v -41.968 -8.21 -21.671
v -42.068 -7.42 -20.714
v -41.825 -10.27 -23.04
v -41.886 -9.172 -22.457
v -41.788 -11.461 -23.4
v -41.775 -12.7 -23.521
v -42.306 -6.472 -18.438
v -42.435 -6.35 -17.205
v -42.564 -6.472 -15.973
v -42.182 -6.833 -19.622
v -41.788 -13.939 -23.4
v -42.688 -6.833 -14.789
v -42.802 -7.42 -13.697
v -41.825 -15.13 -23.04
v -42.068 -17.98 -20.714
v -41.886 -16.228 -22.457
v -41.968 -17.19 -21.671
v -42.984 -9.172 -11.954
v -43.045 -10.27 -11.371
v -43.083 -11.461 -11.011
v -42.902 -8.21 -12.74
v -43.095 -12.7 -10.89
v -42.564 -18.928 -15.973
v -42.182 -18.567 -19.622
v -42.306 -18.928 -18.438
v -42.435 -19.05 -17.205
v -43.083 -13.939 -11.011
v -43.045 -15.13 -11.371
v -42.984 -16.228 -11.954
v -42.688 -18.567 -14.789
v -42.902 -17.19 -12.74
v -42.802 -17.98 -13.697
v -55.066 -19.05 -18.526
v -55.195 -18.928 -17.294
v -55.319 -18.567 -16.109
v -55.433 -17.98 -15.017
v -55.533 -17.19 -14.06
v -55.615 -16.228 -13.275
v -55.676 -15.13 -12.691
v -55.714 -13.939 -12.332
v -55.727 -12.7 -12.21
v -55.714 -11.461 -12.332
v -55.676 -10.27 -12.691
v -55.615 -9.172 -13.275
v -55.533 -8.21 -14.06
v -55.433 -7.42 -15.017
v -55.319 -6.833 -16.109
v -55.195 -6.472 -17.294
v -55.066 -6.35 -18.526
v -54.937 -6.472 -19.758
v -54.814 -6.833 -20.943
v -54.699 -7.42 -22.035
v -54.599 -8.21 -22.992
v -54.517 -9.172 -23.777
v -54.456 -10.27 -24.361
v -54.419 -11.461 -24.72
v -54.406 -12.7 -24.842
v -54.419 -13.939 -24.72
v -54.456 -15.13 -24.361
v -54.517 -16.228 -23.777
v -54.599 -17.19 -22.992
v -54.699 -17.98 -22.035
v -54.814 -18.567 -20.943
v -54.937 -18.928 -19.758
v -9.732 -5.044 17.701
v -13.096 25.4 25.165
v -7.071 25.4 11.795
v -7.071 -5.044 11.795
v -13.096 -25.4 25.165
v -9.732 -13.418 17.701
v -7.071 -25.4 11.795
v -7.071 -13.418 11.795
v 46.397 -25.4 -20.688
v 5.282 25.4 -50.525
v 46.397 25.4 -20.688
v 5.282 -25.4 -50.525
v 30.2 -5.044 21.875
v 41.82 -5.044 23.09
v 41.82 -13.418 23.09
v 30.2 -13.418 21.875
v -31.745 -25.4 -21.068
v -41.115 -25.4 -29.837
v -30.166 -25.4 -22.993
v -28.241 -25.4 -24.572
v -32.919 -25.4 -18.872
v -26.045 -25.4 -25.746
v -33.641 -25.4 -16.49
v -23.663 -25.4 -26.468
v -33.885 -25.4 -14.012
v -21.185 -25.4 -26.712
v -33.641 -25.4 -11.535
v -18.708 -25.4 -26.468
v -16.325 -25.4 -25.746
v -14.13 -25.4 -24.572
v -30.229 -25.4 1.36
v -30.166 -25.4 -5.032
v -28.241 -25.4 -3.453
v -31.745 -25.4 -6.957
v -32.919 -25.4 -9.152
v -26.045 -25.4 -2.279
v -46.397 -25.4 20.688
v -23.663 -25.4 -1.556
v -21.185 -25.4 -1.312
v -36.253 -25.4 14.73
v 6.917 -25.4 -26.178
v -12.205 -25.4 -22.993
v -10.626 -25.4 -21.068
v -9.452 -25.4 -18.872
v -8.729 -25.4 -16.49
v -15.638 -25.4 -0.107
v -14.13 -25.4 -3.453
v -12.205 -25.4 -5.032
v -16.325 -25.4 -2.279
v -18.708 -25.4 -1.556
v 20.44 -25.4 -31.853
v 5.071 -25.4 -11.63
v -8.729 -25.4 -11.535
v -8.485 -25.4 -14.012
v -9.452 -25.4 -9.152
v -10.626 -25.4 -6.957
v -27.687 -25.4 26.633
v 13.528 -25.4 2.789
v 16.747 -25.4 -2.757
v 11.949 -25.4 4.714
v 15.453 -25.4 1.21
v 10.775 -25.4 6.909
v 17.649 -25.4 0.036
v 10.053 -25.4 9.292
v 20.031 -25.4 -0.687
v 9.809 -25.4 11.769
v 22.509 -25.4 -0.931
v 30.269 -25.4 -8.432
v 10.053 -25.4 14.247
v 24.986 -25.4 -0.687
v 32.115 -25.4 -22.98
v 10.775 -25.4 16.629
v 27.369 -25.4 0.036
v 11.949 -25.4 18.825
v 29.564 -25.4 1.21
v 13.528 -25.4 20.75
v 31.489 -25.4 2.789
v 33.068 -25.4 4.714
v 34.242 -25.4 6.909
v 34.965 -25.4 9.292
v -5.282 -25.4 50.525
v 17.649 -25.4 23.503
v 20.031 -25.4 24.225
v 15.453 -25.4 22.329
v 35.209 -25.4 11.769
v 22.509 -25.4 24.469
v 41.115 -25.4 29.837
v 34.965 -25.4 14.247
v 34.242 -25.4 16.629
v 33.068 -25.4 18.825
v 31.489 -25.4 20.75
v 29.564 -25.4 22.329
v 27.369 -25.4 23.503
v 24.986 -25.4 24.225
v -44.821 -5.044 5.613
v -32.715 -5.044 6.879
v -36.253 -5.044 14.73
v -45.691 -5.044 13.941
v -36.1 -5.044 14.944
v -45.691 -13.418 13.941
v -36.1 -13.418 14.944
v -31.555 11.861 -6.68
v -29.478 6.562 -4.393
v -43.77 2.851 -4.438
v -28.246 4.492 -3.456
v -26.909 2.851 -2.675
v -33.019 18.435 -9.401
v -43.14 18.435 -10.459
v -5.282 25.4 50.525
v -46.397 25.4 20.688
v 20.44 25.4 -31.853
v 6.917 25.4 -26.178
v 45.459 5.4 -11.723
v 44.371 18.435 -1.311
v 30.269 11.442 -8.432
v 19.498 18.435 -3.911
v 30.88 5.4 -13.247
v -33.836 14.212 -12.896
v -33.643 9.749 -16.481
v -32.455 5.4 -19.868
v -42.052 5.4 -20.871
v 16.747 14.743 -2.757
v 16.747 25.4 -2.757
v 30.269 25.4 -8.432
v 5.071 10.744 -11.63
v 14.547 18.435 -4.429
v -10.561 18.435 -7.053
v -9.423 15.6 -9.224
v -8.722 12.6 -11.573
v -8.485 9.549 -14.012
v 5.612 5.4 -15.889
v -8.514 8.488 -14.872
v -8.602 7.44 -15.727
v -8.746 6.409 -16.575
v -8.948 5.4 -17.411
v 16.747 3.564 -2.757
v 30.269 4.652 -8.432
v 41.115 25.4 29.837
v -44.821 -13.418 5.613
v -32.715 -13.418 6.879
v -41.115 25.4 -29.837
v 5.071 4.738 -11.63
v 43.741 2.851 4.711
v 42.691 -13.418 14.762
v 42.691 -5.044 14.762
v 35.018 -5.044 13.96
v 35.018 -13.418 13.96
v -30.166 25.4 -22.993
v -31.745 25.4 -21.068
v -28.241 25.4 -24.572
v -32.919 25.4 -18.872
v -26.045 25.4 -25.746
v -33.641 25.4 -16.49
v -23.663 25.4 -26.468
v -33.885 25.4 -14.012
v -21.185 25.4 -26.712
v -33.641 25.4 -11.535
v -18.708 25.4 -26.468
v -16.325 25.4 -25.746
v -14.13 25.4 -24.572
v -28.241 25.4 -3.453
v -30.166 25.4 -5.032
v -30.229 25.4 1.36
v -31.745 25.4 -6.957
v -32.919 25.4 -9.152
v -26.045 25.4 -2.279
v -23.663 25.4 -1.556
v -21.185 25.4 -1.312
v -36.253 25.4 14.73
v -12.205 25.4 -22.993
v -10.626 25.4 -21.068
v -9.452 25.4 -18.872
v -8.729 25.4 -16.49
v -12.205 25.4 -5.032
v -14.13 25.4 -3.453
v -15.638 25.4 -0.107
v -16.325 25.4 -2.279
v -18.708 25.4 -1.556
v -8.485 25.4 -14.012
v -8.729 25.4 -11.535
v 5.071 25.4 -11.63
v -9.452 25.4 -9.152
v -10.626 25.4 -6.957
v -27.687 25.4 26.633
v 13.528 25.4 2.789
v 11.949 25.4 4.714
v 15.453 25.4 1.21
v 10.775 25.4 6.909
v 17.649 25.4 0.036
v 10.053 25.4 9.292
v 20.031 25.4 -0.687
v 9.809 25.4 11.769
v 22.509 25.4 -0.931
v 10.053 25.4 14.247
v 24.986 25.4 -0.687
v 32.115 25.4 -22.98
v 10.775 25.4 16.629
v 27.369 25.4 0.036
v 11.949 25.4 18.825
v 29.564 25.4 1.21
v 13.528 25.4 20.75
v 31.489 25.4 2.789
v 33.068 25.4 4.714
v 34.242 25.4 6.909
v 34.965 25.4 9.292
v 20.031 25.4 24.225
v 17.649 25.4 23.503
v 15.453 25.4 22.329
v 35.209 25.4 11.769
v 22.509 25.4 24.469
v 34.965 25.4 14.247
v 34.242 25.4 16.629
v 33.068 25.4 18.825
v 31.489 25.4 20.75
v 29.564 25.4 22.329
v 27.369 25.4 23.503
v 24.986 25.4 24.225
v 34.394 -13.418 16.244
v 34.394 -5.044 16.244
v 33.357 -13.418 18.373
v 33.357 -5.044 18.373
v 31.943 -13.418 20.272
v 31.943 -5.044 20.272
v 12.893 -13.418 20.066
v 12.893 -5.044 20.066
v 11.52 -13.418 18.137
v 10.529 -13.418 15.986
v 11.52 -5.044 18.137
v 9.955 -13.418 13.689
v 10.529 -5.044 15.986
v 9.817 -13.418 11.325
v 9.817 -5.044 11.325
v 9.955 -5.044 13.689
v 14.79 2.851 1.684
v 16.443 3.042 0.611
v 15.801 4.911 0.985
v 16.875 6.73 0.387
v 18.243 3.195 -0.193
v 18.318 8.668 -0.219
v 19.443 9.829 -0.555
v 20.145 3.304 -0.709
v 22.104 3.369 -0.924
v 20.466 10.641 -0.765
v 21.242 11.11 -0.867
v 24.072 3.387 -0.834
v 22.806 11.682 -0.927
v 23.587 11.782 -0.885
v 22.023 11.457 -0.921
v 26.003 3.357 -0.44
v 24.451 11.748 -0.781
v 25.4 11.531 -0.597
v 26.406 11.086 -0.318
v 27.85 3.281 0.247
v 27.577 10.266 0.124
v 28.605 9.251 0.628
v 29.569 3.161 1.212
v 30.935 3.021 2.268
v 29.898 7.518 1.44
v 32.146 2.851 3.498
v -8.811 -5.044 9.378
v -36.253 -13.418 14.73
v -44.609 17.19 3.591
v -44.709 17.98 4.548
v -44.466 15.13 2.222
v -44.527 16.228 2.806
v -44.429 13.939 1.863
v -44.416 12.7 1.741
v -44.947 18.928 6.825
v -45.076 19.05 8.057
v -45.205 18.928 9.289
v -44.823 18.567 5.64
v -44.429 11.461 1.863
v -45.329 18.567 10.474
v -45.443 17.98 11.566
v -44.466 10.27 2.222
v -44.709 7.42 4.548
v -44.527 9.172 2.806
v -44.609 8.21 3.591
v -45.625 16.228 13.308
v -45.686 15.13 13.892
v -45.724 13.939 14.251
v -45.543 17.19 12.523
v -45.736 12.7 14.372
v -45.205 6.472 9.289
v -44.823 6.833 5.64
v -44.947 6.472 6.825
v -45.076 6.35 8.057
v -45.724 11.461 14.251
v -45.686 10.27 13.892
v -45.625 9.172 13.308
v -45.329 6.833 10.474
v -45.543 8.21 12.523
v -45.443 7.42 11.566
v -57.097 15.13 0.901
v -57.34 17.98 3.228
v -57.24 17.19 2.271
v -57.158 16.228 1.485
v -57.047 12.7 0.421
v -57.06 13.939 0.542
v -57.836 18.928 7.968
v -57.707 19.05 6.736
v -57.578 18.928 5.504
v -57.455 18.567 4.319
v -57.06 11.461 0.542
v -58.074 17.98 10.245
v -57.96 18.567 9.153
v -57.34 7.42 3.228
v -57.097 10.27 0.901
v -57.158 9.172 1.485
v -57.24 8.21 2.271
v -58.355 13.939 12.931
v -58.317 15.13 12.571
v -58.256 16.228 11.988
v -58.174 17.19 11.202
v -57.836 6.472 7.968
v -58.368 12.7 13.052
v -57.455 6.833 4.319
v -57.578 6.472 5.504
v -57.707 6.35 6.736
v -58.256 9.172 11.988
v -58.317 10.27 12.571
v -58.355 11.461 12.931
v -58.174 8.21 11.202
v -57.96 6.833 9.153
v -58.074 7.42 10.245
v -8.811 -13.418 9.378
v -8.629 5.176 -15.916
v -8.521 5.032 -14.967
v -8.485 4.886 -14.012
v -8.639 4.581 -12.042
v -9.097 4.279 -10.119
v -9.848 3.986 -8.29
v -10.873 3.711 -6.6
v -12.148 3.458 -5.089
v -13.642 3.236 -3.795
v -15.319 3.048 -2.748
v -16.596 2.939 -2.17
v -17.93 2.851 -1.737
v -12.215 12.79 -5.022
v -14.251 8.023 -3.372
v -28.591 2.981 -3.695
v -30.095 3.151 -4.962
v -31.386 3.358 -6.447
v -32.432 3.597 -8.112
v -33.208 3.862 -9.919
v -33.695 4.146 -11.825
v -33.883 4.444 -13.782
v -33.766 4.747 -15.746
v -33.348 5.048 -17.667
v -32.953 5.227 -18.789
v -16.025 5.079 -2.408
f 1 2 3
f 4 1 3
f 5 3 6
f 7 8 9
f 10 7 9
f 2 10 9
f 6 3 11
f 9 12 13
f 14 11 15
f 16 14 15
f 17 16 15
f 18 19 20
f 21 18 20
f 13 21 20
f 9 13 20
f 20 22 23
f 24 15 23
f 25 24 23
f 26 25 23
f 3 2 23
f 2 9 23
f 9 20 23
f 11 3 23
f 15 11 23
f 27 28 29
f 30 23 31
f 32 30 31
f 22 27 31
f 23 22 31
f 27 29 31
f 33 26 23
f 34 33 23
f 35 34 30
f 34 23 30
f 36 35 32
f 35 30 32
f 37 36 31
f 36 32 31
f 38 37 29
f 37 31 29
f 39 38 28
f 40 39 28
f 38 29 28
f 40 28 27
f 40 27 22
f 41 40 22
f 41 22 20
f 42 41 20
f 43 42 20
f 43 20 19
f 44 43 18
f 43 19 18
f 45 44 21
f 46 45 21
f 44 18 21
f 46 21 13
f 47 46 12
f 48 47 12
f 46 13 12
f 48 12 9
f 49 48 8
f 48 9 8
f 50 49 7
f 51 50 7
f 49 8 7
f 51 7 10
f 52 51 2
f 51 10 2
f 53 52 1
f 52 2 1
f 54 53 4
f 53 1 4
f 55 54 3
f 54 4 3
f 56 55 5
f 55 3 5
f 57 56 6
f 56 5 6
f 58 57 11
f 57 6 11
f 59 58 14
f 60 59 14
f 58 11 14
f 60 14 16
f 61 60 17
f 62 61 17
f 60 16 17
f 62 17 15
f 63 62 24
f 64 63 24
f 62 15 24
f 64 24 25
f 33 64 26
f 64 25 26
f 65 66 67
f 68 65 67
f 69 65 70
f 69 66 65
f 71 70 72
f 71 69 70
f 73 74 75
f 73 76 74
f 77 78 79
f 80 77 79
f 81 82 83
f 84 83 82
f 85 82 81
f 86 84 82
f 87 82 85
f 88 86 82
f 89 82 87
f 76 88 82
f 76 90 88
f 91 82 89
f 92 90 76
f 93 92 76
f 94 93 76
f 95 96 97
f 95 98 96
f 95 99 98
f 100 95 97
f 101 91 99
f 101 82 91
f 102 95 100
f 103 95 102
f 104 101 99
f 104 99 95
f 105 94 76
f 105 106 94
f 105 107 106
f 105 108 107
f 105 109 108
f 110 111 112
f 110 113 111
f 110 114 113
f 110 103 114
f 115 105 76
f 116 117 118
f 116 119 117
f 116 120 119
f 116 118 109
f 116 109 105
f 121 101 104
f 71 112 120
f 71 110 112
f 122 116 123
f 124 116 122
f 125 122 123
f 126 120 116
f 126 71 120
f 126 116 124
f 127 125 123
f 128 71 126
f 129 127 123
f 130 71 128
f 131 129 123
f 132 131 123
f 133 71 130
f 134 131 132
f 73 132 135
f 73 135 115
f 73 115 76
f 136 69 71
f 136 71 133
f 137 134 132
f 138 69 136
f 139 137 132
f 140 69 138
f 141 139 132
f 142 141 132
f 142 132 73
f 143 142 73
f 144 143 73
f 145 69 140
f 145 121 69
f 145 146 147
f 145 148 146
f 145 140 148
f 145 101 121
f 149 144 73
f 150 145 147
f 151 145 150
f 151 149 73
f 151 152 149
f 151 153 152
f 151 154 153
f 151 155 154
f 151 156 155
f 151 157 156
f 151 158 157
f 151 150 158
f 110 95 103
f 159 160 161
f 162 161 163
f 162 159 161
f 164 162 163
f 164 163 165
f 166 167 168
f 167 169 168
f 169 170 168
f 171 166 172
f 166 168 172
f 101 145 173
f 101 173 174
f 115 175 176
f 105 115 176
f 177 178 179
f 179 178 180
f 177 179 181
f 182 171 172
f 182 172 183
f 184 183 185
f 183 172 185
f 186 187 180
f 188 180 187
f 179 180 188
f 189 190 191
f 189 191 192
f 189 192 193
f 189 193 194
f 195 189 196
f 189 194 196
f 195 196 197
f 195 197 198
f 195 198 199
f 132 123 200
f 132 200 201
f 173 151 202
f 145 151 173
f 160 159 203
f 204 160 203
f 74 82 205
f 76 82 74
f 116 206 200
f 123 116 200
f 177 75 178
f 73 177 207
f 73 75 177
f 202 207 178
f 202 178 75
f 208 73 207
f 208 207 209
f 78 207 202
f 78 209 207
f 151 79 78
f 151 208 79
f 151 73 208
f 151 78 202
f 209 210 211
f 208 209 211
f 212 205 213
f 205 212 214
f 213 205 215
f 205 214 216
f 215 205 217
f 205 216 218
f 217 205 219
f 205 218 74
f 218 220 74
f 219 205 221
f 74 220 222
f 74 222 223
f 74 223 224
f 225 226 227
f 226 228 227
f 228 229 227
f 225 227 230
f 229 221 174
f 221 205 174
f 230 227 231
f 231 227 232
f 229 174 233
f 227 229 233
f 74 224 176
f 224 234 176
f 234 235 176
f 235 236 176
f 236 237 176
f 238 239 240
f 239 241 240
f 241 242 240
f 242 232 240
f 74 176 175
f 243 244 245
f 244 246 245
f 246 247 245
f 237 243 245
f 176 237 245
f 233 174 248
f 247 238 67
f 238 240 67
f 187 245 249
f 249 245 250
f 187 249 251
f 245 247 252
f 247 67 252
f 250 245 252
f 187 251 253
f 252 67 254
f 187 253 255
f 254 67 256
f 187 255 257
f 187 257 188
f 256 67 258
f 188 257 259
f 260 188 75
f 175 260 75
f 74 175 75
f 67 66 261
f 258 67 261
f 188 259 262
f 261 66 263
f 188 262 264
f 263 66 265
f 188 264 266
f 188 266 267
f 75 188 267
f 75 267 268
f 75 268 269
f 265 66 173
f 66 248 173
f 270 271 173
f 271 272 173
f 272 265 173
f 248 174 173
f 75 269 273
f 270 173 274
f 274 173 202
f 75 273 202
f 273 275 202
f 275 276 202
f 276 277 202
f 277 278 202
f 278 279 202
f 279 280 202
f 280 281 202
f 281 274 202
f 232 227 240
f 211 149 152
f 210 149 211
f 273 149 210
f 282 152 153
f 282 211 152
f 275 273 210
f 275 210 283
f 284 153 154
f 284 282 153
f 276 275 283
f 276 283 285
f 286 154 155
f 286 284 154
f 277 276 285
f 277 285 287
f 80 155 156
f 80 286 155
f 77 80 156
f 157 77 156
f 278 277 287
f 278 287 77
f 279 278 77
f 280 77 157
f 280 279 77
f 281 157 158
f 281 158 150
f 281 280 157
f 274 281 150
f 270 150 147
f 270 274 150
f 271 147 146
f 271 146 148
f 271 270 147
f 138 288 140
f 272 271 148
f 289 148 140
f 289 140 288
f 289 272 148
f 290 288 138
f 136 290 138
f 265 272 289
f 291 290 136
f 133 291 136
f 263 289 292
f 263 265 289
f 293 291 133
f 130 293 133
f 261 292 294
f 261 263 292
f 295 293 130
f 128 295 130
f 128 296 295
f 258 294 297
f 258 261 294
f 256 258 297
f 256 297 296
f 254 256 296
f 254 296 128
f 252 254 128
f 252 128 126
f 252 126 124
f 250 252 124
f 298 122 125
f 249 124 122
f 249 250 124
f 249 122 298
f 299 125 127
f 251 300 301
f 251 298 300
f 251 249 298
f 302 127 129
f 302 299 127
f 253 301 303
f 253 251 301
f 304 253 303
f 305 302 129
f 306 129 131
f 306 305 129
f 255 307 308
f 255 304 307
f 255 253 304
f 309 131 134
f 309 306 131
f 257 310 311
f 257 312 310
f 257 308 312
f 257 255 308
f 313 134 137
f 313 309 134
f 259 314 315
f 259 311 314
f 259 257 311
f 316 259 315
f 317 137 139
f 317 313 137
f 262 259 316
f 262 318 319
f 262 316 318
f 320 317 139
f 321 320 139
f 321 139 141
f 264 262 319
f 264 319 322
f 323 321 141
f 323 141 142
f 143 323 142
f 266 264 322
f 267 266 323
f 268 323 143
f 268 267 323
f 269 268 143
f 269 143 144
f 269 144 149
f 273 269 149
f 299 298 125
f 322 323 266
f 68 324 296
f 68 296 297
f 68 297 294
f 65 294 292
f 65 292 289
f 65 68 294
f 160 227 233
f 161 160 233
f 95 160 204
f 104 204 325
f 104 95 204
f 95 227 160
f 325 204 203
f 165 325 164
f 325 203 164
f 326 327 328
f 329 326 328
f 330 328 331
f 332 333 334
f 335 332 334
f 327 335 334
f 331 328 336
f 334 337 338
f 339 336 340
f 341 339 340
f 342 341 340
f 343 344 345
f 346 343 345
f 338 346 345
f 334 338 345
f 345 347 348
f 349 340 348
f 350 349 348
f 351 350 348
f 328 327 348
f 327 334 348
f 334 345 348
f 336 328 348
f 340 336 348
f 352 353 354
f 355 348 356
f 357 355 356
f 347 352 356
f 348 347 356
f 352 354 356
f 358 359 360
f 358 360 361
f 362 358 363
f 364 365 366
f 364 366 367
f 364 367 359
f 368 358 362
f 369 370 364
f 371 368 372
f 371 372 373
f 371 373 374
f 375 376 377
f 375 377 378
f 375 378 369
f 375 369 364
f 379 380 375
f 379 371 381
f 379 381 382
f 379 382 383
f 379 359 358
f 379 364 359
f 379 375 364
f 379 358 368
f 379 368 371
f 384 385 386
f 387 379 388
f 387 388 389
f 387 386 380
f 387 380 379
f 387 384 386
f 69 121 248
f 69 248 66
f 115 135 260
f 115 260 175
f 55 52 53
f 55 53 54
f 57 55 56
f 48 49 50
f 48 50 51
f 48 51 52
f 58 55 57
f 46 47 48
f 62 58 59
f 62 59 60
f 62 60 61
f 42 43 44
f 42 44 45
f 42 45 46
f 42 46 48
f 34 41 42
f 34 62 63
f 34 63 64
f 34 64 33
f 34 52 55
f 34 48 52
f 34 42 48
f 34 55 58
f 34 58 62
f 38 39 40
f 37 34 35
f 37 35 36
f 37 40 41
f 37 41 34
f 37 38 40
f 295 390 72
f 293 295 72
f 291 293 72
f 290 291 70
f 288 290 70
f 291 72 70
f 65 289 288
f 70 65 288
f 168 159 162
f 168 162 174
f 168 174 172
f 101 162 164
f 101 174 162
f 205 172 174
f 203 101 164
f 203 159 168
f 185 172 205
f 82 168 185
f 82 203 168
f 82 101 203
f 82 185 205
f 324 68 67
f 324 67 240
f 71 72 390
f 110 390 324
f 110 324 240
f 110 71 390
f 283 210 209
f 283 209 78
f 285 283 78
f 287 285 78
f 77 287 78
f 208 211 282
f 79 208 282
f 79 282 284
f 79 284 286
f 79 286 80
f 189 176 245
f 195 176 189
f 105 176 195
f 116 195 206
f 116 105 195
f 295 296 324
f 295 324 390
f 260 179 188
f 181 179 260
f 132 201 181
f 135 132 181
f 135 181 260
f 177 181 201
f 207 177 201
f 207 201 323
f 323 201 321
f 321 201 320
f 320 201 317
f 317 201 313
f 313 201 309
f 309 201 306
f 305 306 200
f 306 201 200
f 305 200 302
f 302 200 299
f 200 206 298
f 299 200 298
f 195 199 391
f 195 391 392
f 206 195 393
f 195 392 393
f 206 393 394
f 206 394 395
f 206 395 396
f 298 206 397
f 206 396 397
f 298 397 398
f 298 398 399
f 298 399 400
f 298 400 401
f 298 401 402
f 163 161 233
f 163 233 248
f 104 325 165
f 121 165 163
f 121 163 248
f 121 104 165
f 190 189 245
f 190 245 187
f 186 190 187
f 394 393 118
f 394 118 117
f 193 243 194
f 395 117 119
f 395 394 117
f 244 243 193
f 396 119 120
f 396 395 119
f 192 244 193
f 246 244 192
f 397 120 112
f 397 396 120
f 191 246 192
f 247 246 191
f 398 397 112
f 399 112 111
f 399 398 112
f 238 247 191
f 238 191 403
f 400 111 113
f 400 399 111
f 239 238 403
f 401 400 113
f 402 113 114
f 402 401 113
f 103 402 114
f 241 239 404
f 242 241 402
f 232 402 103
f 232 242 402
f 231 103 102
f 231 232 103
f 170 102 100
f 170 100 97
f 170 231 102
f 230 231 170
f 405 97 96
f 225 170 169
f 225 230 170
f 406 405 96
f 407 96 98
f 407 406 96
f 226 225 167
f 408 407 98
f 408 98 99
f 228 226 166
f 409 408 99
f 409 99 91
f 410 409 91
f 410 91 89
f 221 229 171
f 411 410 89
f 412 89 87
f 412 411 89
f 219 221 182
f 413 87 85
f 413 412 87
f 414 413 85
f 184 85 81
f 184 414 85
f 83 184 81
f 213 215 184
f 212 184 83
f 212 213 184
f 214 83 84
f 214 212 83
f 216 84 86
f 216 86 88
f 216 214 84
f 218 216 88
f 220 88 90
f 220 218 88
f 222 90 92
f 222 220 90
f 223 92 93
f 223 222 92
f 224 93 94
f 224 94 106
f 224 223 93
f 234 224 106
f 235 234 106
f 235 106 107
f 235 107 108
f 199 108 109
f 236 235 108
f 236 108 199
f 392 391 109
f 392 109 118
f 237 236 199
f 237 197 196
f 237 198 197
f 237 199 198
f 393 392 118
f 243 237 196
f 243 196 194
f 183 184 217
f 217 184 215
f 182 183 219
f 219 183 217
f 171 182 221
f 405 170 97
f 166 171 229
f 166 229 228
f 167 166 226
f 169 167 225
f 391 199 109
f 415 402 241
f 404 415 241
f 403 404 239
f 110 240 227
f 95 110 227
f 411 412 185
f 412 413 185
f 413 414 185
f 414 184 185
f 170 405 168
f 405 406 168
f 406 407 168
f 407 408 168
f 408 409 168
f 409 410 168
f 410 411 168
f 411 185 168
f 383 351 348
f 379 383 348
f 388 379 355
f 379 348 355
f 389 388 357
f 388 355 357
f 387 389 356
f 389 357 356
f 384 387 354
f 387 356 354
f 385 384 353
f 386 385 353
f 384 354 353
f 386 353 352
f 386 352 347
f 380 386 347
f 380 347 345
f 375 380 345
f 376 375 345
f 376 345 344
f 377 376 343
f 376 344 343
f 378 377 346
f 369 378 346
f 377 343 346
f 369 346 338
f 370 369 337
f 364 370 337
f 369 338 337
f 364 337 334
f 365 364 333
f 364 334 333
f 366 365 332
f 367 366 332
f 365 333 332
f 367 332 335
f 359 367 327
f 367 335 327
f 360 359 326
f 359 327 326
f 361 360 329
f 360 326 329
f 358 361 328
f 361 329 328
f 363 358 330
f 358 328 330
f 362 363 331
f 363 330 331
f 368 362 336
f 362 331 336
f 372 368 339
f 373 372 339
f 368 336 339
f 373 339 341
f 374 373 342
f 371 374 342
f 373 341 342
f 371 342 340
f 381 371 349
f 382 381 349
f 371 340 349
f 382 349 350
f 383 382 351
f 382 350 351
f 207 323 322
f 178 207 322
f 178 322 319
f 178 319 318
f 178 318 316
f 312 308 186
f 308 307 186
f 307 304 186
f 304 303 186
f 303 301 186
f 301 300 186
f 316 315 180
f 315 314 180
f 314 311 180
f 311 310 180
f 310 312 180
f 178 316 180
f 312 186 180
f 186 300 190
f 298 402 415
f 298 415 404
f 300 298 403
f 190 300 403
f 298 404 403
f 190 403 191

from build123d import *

# Parameters (mm, degrees)
F0_R     = 12.7
F1_DEPTH = 25.4
F2_W     = 8.3738137037
F2_H     = 8.3738137037
F3_DEPTH = 95.393597984
F4_R     = 6.35
F5_DEPTH = 12.7


with BuildPart() as f1:
    # F0 (on Front) → F1 (new body, symmetric)
    with BuildSketch(Plane.XZ):
        Polygon((5.2819887405, -50.5246533382), (46.3966276785, -20.6879902374), (41.1146389381, 29.8366631009), (-5.2819887405, 50.5246533382), (-46.3966276785, 20.6879902374), (-41.1146389381, -29.8366631009), align=None)
        with Locations((-21.185264774, -14.0123001843)):
            Circle(F0_R, mode=Mode.SUBTRACT)
        Polygon((30.2690706552, -8.4316877652), (32.1153645894, -22.9796956027), (20.4395671947, -31.8526369714), (6.9174758659, -26.1775705025), (5.0711819316, -11.6295626649), (16.7469793263, -2.7566212963), align=None, mode=Mode.SUBTRACT)
        Polygon((-13.0957929031, 25.1650677821), (-7.071361904, 11.7949681389), (-15.6379923466, -0.1073919713), (-30.2290537883, 1.3603475617), (-36.2534847874, 14.730447205), (-27.6868543448, 26.6328073152), align=None, mode=Mode.SUBTRACT)
        with Locations((22.5087539272, 11.7692819085)):
            Circle(F0_R, mode=Mode.SUBTRACT)
    extrude(amount=F1_DEPTH, both=True)

    # F2 (on face) → F3 (cut, through all)
    with BuildSketch(Plane(origin=(-43.7556333083, 0, -4.5743364318), x_dir=(0, -1, 0), z_dir=(-0.9945797901, 0, -0.1039761563))):
        with Locations((9.2308046296, 14.429773204)):
            Rectangle(F2_W, F2_H)
        Polygon((-18.4350283168, -5.9171013498), (-5.4001929887, -16.3859397209), (-2.8513306752, 0.136977993), align=None)
    extrude(amount=-F3_DEPTH, mode=Mode.SUBTRACT)


with BuildPart() as f5:
    # F4 (on face) → F5 (new body)
    with BuildSketch(Plane(origin=(-43.7556333083, 0, -4.5743364318), x_dir=(0, -1, 0), z_dir=(-0.9945797901, 0, -0.1039761563))):
        with Locations((-12.7, 12.7)):
            Circle(F4_R)
    extrude(amount=F5_DEPTH)


with BuildPart() as f5b:
    # F4 (on face) → F5, piece 2 (new body)
    with BuildSketch(Plane(origin=(-43.7556333083, 0, -4.5743364318), x_dir=(0, -1, 0), z_dir=(-0.9945797901, 0, -0.1039761563))):
        with Locations((12.7, -12.7)):
            Circle(F4_R)
    extrude(amount=F5_DEPTH)


solid = Compound([f1.part, f5.part, f5b.part])
